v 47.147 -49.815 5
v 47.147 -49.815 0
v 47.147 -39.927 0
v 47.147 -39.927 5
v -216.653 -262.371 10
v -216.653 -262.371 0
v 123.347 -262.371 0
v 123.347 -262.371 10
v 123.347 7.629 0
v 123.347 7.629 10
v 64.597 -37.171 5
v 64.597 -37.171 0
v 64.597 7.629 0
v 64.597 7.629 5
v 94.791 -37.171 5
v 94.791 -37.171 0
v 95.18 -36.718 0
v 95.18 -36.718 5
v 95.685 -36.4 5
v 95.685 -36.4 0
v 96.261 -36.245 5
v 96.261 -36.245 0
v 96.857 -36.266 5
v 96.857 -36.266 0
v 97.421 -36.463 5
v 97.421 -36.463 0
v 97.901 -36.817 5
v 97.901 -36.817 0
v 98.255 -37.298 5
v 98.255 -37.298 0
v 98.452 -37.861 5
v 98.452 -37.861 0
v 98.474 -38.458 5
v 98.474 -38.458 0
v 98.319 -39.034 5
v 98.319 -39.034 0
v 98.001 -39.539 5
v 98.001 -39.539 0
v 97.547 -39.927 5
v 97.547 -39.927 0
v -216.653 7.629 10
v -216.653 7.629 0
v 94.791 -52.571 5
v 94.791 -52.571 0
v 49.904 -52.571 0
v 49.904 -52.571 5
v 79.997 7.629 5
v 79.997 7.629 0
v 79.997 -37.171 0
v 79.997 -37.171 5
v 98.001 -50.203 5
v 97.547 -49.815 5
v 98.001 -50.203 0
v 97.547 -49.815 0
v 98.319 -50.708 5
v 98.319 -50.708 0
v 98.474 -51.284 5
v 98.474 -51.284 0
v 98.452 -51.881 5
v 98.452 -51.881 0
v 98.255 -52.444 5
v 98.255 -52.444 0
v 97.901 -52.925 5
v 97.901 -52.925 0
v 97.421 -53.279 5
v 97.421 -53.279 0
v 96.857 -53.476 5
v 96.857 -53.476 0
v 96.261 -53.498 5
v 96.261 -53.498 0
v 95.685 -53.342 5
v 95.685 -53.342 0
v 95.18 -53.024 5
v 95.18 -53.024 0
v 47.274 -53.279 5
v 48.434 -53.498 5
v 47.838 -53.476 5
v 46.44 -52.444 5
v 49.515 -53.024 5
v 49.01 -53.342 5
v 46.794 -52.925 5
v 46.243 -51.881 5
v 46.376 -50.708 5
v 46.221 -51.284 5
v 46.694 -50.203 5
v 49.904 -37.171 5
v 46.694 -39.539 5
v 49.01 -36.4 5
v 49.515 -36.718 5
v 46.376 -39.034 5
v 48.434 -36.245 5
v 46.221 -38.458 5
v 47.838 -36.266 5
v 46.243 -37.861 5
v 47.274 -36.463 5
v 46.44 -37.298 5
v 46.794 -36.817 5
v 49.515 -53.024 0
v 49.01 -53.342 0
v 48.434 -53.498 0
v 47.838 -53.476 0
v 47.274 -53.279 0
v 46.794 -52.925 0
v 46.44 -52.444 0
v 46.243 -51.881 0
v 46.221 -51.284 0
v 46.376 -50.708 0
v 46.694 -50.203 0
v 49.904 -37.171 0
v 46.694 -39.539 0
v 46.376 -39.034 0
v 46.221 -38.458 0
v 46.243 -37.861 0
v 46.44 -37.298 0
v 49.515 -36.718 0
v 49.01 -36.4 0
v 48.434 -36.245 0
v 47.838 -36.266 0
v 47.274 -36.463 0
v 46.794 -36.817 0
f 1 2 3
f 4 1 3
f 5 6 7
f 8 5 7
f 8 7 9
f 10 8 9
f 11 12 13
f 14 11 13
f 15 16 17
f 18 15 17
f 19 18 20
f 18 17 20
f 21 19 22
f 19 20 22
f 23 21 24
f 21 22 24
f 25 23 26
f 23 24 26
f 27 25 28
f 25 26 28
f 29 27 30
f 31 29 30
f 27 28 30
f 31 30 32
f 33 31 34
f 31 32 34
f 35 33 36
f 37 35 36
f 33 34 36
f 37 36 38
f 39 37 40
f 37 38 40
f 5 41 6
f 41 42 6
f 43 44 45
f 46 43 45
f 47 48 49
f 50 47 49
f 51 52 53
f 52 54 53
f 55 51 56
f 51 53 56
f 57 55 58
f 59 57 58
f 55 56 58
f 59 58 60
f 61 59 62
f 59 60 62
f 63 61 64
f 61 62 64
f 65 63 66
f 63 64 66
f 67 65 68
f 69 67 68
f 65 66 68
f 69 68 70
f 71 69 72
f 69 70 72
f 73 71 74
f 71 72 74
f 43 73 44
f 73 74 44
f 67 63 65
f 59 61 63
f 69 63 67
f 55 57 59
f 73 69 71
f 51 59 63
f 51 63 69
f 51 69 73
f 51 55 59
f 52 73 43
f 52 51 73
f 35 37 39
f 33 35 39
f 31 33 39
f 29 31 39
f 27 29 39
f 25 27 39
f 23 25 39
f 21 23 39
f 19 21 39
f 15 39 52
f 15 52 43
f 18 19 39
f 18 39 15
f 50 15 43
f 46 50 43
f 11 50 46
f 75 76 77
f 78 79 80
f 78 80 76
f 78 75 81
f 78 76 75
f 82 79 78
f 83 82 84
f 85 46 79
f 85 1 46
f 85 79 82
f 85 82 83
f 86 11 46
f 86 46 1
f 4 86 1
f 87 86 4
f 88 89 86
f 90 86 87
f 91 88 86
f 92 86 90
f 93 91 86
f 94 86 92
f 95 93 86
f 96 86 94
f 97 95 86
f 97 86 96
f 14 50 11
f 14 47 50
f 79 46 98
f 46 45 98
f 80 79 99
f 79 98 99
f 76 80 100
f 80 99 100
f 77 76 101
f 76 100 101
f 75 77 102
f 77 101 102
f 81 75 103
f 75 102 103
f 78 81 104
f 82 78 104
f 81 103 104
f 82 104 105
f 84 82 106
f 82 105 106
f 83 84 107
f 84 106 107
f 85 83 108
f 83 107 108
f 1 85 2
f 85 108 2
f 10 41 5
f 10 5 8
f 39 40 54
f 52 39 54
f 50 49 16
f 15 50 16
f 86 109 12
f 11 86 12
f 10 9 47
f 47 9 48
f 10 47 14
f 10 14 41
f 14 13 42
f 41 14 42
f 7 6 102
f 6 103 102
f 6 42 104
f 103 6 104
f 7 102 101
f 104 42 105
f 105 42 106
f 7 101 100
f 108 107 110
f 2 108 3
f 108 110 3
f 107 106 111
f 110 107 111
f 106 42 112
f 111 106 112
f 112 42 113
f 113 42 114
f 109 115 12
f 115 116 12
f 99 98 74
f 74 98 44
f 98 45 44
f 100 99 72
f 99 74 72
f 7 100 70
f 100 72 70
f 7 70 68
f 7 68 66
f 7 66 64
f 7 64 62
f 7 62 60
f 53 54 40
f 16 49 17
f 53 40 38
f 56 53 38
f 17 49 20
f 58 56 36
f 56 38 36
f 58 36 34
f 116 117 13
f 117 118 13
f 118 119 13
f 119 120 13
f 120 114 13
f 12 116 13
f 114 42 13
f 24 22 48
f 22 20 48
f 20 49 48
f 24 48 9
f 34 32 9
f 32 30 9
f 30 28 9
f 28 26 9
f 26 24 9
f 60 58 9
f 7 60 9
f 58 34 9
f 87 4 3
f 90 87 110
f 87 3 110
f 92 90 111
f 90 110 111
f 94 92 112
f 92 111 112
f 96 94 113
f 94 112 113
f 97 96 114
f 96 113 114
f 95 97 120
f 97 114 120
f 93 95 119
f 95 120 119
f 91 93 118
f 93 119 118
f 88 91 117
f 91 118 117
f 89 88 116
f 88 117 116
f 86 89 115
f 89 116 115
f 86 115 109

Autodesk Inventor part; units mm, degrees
ref_plane "YZ Plane" through (0, 0, 0) normal (1, 0, 0) x (0, 1, 0)
ref_plane "XZ Plane" through (0, 0, 0) normal (0, 1, 0) x (-1, 0, 0)
ref_plane "XY Plane" through (0, 0, 0) normal (0, 0, 1) x (1, 0, 0)
sketch "Sketch1" plane through (0, 0, 0) normal (0, 0, 1) x (1, 0, 0)
  line L0 (-216.6526, -262.3711) -> (123.3474, -262.3711)
  line L1 (123.3474, -262.3711) -> (123.3474, 7.6289)
  line L2 (123.3474, 7.6289) -> (-216.6526, 7.6289)
  line L3 (-216.6526, 7.6289) -> (-216.6526, -262.3711)
  point P0 (0, 0)
  dimension "d0" = 340
  dimension "d1" = 270
extrude "Extrusion1" add sketch "Sketch1" along normal blind 10
sketch "Sketch2" plane through (0, 0, 0) normal (0, 0, -1) x (-1, 0, 0)
  line L0 (-66.3474, -50.3711) -> (-66.3474, -52.3711) construction
  line L1 (-66.3474, -52.3711) -> (-47.3474, -52.3711) construction
  line L2 (-47.3474, -52.3711) -> (-47.3474, -37.3711) construction
  line L3 (-47.3474, -37.3711) -> (-64.7974, -37.3711) construction
  line L4 (-64.7974, -37.3711) -> (-64.7974, -42.3711) construction
  line L5 (-64.7974, -42.3711) -> (-79.8974, -42.3711) construction
  line L6 (-79.8974, -42.3711) -> (-79.8974, -37.3711) construction
  line L7 (-79.8974, -37.3711) -> (-97.3474, -37.3711) construction
  line L8 (-97.3474, -37.3711) -> (-97.3474, -52.3711) construction
  line L9 (-97.3474, -52.3711) -> (-78.3474, -52.3711) construction
  line L10 (-78.3474, -52.3711) -> (-78.3474, -50.3711) construction
  line L11 (-78.3474, -50.3711) -> (-66.3474, -50.3711) construction
  line L12 (-79.7974, -42.3711) -> (-79.7974, -9.1428) construction
  line L13 (-64.7974, -42.3711) -> (-79.7974, -42.3711) construction
  line L14 (-64.7974, -42.3711) -> (-64.7974, -9.1428) construction
  line L15 (-79.7974, -26.2239) -> (-79.7974, -29.3711) construction
  line L16 (-79.7974, -29.3711) -> (-64.7974, -29.3711) construction
  line L17 (-64.7974, -29.3711) -> (-64.7974, -26.2239) construction
  line L18 (-64.7974, -26.2239) -> (-79.7974, -26.2239) construction
  line L19 (-79.7974, 7.2343) -> (-64.7974, 7.2343) construction
  line L20 (-79.7974, -9.1428) -> (-79.7974, 7.2343) construction
  line L21 (-64.7974, 7.2343) -> (-64.7974, -9.1428) construction
  line L22 (-123.3474, 7.6289) -> (216.6526, 7.6289) projected
  line L23 (-79.9974, 7.6289) -> (-79.9974, -37.1711)
  line L24 (-79.9974, -37.1711) -> (-97.5474, -37.1711)
  line L25 (-97.5474, -37.1711) -> (-97.5474, -52.5711)
  line L26 (-97.5474, -52.5711) -> (-47.1474, -52.5711)
  line L27 (-47.1474, -52.5711) -> (-47.1474, -37.1711)
  line L28 (-47.1474, -37.1711) -> (-64.5974, -37.1711)
  line L29 (-64.5974, -37.1711) -> (-64.5974, 7.6289)
  line L30 (-79.9974, 7.6289) -> (-64.5974, 7.6289)
  circle A0 centre (-57.3474, -44.8711) radius 1.621 projected
  circle A1 centre (-87.3474, -44.8711) radius 1.621 projected
  line L31 (-64.7974, -9.1428) -> (-79.7974, -9.1428) projected
  line L32 (-64.7974, -9.1428) -> (-79.7974, -9.1428) projected
  circle A2 centre (-72.2869, -16.8711) radius 1.621 projected
  circle A3 centre (-72.2869, -36.8711) radius 1.621 projected
  point P0 (0, 0)
  dimension "d4" = 0.2
  dimension "d5" = 0.2
  dimension "d6" = 0.2
  dimension "d7" = 0.2
  dimension "d8" = 0.2
  dimension "d9" = 0.2
extrude "Extrusion2" cut sketch "Sketch2" against normal blind 5 contours L22 L29 L28 L27 L26 L25 L24 L23 | A0 | A1 | A2 | A3
sketch "Sketch4" plane through (0, 0, 0) normal (0, 0, -1) x (-1, 0, 0)
  circle A0 centre (-48.2081, -38.2317) radius 2
  line L0 (-47.1474, -37.1711) -> (-47.1474, -52.5711) projected
  line L1 (-47.1474, -37.1711) -> (-48.0356, -38.0592) construction
  line L2 (-64.5974, -37.1711) -> (-47.1474, -37.1711) projected
  circle A1 centre (-48.2081, -51.5104) radius 2
  circle A2 centre (-96.4868, -51.5104) radius 2
  circle A3 centre (-96.4868, -38.2317) radius 2
  line L3 (-47.1474, -52.5711) -> (-49.4974, -50.2211) construction
  line L4 (-47.1474, -52.5711) -> (-97.5474, -52.5711) projected
  line L5 (-97.5474, -52.5711) -> (-95.2238, -50.2474) construction
  line L6 (-97.5474, -37.1711) -> (-95.2759, -39.4427) construction
  line L7 (-97.5474, -52.5711) -> (-97.5474, -37.1711) projected
  point P0 (0, 0)
  dimension "d17" = 4
  dimension "d18" = 45
  dimension "d19" = 1.5
  dimension "d20" = 4
  dimension "d21" = 4
  dimension "d22" = 4
  dimension "d23" = 45
  dimension "d24" = 45
  dimension "d25" = 1.5
  dimension "d26" = 1.5
  dimension "d27" = 1.5
extrude "Extrusion4" cut sketch "Sketch4" against normal up to surface (5 mm away)
equation "\"d20\" = d17"
equation "\"d21\" = d17"
equation "\"d22\" = d17"
equation "\"d25\" = d19"
equation "\"d26\" = d19"
equation "\"d27\" = d19"
properties part number "baseplate" material "Aluminum 6061-AHC"
